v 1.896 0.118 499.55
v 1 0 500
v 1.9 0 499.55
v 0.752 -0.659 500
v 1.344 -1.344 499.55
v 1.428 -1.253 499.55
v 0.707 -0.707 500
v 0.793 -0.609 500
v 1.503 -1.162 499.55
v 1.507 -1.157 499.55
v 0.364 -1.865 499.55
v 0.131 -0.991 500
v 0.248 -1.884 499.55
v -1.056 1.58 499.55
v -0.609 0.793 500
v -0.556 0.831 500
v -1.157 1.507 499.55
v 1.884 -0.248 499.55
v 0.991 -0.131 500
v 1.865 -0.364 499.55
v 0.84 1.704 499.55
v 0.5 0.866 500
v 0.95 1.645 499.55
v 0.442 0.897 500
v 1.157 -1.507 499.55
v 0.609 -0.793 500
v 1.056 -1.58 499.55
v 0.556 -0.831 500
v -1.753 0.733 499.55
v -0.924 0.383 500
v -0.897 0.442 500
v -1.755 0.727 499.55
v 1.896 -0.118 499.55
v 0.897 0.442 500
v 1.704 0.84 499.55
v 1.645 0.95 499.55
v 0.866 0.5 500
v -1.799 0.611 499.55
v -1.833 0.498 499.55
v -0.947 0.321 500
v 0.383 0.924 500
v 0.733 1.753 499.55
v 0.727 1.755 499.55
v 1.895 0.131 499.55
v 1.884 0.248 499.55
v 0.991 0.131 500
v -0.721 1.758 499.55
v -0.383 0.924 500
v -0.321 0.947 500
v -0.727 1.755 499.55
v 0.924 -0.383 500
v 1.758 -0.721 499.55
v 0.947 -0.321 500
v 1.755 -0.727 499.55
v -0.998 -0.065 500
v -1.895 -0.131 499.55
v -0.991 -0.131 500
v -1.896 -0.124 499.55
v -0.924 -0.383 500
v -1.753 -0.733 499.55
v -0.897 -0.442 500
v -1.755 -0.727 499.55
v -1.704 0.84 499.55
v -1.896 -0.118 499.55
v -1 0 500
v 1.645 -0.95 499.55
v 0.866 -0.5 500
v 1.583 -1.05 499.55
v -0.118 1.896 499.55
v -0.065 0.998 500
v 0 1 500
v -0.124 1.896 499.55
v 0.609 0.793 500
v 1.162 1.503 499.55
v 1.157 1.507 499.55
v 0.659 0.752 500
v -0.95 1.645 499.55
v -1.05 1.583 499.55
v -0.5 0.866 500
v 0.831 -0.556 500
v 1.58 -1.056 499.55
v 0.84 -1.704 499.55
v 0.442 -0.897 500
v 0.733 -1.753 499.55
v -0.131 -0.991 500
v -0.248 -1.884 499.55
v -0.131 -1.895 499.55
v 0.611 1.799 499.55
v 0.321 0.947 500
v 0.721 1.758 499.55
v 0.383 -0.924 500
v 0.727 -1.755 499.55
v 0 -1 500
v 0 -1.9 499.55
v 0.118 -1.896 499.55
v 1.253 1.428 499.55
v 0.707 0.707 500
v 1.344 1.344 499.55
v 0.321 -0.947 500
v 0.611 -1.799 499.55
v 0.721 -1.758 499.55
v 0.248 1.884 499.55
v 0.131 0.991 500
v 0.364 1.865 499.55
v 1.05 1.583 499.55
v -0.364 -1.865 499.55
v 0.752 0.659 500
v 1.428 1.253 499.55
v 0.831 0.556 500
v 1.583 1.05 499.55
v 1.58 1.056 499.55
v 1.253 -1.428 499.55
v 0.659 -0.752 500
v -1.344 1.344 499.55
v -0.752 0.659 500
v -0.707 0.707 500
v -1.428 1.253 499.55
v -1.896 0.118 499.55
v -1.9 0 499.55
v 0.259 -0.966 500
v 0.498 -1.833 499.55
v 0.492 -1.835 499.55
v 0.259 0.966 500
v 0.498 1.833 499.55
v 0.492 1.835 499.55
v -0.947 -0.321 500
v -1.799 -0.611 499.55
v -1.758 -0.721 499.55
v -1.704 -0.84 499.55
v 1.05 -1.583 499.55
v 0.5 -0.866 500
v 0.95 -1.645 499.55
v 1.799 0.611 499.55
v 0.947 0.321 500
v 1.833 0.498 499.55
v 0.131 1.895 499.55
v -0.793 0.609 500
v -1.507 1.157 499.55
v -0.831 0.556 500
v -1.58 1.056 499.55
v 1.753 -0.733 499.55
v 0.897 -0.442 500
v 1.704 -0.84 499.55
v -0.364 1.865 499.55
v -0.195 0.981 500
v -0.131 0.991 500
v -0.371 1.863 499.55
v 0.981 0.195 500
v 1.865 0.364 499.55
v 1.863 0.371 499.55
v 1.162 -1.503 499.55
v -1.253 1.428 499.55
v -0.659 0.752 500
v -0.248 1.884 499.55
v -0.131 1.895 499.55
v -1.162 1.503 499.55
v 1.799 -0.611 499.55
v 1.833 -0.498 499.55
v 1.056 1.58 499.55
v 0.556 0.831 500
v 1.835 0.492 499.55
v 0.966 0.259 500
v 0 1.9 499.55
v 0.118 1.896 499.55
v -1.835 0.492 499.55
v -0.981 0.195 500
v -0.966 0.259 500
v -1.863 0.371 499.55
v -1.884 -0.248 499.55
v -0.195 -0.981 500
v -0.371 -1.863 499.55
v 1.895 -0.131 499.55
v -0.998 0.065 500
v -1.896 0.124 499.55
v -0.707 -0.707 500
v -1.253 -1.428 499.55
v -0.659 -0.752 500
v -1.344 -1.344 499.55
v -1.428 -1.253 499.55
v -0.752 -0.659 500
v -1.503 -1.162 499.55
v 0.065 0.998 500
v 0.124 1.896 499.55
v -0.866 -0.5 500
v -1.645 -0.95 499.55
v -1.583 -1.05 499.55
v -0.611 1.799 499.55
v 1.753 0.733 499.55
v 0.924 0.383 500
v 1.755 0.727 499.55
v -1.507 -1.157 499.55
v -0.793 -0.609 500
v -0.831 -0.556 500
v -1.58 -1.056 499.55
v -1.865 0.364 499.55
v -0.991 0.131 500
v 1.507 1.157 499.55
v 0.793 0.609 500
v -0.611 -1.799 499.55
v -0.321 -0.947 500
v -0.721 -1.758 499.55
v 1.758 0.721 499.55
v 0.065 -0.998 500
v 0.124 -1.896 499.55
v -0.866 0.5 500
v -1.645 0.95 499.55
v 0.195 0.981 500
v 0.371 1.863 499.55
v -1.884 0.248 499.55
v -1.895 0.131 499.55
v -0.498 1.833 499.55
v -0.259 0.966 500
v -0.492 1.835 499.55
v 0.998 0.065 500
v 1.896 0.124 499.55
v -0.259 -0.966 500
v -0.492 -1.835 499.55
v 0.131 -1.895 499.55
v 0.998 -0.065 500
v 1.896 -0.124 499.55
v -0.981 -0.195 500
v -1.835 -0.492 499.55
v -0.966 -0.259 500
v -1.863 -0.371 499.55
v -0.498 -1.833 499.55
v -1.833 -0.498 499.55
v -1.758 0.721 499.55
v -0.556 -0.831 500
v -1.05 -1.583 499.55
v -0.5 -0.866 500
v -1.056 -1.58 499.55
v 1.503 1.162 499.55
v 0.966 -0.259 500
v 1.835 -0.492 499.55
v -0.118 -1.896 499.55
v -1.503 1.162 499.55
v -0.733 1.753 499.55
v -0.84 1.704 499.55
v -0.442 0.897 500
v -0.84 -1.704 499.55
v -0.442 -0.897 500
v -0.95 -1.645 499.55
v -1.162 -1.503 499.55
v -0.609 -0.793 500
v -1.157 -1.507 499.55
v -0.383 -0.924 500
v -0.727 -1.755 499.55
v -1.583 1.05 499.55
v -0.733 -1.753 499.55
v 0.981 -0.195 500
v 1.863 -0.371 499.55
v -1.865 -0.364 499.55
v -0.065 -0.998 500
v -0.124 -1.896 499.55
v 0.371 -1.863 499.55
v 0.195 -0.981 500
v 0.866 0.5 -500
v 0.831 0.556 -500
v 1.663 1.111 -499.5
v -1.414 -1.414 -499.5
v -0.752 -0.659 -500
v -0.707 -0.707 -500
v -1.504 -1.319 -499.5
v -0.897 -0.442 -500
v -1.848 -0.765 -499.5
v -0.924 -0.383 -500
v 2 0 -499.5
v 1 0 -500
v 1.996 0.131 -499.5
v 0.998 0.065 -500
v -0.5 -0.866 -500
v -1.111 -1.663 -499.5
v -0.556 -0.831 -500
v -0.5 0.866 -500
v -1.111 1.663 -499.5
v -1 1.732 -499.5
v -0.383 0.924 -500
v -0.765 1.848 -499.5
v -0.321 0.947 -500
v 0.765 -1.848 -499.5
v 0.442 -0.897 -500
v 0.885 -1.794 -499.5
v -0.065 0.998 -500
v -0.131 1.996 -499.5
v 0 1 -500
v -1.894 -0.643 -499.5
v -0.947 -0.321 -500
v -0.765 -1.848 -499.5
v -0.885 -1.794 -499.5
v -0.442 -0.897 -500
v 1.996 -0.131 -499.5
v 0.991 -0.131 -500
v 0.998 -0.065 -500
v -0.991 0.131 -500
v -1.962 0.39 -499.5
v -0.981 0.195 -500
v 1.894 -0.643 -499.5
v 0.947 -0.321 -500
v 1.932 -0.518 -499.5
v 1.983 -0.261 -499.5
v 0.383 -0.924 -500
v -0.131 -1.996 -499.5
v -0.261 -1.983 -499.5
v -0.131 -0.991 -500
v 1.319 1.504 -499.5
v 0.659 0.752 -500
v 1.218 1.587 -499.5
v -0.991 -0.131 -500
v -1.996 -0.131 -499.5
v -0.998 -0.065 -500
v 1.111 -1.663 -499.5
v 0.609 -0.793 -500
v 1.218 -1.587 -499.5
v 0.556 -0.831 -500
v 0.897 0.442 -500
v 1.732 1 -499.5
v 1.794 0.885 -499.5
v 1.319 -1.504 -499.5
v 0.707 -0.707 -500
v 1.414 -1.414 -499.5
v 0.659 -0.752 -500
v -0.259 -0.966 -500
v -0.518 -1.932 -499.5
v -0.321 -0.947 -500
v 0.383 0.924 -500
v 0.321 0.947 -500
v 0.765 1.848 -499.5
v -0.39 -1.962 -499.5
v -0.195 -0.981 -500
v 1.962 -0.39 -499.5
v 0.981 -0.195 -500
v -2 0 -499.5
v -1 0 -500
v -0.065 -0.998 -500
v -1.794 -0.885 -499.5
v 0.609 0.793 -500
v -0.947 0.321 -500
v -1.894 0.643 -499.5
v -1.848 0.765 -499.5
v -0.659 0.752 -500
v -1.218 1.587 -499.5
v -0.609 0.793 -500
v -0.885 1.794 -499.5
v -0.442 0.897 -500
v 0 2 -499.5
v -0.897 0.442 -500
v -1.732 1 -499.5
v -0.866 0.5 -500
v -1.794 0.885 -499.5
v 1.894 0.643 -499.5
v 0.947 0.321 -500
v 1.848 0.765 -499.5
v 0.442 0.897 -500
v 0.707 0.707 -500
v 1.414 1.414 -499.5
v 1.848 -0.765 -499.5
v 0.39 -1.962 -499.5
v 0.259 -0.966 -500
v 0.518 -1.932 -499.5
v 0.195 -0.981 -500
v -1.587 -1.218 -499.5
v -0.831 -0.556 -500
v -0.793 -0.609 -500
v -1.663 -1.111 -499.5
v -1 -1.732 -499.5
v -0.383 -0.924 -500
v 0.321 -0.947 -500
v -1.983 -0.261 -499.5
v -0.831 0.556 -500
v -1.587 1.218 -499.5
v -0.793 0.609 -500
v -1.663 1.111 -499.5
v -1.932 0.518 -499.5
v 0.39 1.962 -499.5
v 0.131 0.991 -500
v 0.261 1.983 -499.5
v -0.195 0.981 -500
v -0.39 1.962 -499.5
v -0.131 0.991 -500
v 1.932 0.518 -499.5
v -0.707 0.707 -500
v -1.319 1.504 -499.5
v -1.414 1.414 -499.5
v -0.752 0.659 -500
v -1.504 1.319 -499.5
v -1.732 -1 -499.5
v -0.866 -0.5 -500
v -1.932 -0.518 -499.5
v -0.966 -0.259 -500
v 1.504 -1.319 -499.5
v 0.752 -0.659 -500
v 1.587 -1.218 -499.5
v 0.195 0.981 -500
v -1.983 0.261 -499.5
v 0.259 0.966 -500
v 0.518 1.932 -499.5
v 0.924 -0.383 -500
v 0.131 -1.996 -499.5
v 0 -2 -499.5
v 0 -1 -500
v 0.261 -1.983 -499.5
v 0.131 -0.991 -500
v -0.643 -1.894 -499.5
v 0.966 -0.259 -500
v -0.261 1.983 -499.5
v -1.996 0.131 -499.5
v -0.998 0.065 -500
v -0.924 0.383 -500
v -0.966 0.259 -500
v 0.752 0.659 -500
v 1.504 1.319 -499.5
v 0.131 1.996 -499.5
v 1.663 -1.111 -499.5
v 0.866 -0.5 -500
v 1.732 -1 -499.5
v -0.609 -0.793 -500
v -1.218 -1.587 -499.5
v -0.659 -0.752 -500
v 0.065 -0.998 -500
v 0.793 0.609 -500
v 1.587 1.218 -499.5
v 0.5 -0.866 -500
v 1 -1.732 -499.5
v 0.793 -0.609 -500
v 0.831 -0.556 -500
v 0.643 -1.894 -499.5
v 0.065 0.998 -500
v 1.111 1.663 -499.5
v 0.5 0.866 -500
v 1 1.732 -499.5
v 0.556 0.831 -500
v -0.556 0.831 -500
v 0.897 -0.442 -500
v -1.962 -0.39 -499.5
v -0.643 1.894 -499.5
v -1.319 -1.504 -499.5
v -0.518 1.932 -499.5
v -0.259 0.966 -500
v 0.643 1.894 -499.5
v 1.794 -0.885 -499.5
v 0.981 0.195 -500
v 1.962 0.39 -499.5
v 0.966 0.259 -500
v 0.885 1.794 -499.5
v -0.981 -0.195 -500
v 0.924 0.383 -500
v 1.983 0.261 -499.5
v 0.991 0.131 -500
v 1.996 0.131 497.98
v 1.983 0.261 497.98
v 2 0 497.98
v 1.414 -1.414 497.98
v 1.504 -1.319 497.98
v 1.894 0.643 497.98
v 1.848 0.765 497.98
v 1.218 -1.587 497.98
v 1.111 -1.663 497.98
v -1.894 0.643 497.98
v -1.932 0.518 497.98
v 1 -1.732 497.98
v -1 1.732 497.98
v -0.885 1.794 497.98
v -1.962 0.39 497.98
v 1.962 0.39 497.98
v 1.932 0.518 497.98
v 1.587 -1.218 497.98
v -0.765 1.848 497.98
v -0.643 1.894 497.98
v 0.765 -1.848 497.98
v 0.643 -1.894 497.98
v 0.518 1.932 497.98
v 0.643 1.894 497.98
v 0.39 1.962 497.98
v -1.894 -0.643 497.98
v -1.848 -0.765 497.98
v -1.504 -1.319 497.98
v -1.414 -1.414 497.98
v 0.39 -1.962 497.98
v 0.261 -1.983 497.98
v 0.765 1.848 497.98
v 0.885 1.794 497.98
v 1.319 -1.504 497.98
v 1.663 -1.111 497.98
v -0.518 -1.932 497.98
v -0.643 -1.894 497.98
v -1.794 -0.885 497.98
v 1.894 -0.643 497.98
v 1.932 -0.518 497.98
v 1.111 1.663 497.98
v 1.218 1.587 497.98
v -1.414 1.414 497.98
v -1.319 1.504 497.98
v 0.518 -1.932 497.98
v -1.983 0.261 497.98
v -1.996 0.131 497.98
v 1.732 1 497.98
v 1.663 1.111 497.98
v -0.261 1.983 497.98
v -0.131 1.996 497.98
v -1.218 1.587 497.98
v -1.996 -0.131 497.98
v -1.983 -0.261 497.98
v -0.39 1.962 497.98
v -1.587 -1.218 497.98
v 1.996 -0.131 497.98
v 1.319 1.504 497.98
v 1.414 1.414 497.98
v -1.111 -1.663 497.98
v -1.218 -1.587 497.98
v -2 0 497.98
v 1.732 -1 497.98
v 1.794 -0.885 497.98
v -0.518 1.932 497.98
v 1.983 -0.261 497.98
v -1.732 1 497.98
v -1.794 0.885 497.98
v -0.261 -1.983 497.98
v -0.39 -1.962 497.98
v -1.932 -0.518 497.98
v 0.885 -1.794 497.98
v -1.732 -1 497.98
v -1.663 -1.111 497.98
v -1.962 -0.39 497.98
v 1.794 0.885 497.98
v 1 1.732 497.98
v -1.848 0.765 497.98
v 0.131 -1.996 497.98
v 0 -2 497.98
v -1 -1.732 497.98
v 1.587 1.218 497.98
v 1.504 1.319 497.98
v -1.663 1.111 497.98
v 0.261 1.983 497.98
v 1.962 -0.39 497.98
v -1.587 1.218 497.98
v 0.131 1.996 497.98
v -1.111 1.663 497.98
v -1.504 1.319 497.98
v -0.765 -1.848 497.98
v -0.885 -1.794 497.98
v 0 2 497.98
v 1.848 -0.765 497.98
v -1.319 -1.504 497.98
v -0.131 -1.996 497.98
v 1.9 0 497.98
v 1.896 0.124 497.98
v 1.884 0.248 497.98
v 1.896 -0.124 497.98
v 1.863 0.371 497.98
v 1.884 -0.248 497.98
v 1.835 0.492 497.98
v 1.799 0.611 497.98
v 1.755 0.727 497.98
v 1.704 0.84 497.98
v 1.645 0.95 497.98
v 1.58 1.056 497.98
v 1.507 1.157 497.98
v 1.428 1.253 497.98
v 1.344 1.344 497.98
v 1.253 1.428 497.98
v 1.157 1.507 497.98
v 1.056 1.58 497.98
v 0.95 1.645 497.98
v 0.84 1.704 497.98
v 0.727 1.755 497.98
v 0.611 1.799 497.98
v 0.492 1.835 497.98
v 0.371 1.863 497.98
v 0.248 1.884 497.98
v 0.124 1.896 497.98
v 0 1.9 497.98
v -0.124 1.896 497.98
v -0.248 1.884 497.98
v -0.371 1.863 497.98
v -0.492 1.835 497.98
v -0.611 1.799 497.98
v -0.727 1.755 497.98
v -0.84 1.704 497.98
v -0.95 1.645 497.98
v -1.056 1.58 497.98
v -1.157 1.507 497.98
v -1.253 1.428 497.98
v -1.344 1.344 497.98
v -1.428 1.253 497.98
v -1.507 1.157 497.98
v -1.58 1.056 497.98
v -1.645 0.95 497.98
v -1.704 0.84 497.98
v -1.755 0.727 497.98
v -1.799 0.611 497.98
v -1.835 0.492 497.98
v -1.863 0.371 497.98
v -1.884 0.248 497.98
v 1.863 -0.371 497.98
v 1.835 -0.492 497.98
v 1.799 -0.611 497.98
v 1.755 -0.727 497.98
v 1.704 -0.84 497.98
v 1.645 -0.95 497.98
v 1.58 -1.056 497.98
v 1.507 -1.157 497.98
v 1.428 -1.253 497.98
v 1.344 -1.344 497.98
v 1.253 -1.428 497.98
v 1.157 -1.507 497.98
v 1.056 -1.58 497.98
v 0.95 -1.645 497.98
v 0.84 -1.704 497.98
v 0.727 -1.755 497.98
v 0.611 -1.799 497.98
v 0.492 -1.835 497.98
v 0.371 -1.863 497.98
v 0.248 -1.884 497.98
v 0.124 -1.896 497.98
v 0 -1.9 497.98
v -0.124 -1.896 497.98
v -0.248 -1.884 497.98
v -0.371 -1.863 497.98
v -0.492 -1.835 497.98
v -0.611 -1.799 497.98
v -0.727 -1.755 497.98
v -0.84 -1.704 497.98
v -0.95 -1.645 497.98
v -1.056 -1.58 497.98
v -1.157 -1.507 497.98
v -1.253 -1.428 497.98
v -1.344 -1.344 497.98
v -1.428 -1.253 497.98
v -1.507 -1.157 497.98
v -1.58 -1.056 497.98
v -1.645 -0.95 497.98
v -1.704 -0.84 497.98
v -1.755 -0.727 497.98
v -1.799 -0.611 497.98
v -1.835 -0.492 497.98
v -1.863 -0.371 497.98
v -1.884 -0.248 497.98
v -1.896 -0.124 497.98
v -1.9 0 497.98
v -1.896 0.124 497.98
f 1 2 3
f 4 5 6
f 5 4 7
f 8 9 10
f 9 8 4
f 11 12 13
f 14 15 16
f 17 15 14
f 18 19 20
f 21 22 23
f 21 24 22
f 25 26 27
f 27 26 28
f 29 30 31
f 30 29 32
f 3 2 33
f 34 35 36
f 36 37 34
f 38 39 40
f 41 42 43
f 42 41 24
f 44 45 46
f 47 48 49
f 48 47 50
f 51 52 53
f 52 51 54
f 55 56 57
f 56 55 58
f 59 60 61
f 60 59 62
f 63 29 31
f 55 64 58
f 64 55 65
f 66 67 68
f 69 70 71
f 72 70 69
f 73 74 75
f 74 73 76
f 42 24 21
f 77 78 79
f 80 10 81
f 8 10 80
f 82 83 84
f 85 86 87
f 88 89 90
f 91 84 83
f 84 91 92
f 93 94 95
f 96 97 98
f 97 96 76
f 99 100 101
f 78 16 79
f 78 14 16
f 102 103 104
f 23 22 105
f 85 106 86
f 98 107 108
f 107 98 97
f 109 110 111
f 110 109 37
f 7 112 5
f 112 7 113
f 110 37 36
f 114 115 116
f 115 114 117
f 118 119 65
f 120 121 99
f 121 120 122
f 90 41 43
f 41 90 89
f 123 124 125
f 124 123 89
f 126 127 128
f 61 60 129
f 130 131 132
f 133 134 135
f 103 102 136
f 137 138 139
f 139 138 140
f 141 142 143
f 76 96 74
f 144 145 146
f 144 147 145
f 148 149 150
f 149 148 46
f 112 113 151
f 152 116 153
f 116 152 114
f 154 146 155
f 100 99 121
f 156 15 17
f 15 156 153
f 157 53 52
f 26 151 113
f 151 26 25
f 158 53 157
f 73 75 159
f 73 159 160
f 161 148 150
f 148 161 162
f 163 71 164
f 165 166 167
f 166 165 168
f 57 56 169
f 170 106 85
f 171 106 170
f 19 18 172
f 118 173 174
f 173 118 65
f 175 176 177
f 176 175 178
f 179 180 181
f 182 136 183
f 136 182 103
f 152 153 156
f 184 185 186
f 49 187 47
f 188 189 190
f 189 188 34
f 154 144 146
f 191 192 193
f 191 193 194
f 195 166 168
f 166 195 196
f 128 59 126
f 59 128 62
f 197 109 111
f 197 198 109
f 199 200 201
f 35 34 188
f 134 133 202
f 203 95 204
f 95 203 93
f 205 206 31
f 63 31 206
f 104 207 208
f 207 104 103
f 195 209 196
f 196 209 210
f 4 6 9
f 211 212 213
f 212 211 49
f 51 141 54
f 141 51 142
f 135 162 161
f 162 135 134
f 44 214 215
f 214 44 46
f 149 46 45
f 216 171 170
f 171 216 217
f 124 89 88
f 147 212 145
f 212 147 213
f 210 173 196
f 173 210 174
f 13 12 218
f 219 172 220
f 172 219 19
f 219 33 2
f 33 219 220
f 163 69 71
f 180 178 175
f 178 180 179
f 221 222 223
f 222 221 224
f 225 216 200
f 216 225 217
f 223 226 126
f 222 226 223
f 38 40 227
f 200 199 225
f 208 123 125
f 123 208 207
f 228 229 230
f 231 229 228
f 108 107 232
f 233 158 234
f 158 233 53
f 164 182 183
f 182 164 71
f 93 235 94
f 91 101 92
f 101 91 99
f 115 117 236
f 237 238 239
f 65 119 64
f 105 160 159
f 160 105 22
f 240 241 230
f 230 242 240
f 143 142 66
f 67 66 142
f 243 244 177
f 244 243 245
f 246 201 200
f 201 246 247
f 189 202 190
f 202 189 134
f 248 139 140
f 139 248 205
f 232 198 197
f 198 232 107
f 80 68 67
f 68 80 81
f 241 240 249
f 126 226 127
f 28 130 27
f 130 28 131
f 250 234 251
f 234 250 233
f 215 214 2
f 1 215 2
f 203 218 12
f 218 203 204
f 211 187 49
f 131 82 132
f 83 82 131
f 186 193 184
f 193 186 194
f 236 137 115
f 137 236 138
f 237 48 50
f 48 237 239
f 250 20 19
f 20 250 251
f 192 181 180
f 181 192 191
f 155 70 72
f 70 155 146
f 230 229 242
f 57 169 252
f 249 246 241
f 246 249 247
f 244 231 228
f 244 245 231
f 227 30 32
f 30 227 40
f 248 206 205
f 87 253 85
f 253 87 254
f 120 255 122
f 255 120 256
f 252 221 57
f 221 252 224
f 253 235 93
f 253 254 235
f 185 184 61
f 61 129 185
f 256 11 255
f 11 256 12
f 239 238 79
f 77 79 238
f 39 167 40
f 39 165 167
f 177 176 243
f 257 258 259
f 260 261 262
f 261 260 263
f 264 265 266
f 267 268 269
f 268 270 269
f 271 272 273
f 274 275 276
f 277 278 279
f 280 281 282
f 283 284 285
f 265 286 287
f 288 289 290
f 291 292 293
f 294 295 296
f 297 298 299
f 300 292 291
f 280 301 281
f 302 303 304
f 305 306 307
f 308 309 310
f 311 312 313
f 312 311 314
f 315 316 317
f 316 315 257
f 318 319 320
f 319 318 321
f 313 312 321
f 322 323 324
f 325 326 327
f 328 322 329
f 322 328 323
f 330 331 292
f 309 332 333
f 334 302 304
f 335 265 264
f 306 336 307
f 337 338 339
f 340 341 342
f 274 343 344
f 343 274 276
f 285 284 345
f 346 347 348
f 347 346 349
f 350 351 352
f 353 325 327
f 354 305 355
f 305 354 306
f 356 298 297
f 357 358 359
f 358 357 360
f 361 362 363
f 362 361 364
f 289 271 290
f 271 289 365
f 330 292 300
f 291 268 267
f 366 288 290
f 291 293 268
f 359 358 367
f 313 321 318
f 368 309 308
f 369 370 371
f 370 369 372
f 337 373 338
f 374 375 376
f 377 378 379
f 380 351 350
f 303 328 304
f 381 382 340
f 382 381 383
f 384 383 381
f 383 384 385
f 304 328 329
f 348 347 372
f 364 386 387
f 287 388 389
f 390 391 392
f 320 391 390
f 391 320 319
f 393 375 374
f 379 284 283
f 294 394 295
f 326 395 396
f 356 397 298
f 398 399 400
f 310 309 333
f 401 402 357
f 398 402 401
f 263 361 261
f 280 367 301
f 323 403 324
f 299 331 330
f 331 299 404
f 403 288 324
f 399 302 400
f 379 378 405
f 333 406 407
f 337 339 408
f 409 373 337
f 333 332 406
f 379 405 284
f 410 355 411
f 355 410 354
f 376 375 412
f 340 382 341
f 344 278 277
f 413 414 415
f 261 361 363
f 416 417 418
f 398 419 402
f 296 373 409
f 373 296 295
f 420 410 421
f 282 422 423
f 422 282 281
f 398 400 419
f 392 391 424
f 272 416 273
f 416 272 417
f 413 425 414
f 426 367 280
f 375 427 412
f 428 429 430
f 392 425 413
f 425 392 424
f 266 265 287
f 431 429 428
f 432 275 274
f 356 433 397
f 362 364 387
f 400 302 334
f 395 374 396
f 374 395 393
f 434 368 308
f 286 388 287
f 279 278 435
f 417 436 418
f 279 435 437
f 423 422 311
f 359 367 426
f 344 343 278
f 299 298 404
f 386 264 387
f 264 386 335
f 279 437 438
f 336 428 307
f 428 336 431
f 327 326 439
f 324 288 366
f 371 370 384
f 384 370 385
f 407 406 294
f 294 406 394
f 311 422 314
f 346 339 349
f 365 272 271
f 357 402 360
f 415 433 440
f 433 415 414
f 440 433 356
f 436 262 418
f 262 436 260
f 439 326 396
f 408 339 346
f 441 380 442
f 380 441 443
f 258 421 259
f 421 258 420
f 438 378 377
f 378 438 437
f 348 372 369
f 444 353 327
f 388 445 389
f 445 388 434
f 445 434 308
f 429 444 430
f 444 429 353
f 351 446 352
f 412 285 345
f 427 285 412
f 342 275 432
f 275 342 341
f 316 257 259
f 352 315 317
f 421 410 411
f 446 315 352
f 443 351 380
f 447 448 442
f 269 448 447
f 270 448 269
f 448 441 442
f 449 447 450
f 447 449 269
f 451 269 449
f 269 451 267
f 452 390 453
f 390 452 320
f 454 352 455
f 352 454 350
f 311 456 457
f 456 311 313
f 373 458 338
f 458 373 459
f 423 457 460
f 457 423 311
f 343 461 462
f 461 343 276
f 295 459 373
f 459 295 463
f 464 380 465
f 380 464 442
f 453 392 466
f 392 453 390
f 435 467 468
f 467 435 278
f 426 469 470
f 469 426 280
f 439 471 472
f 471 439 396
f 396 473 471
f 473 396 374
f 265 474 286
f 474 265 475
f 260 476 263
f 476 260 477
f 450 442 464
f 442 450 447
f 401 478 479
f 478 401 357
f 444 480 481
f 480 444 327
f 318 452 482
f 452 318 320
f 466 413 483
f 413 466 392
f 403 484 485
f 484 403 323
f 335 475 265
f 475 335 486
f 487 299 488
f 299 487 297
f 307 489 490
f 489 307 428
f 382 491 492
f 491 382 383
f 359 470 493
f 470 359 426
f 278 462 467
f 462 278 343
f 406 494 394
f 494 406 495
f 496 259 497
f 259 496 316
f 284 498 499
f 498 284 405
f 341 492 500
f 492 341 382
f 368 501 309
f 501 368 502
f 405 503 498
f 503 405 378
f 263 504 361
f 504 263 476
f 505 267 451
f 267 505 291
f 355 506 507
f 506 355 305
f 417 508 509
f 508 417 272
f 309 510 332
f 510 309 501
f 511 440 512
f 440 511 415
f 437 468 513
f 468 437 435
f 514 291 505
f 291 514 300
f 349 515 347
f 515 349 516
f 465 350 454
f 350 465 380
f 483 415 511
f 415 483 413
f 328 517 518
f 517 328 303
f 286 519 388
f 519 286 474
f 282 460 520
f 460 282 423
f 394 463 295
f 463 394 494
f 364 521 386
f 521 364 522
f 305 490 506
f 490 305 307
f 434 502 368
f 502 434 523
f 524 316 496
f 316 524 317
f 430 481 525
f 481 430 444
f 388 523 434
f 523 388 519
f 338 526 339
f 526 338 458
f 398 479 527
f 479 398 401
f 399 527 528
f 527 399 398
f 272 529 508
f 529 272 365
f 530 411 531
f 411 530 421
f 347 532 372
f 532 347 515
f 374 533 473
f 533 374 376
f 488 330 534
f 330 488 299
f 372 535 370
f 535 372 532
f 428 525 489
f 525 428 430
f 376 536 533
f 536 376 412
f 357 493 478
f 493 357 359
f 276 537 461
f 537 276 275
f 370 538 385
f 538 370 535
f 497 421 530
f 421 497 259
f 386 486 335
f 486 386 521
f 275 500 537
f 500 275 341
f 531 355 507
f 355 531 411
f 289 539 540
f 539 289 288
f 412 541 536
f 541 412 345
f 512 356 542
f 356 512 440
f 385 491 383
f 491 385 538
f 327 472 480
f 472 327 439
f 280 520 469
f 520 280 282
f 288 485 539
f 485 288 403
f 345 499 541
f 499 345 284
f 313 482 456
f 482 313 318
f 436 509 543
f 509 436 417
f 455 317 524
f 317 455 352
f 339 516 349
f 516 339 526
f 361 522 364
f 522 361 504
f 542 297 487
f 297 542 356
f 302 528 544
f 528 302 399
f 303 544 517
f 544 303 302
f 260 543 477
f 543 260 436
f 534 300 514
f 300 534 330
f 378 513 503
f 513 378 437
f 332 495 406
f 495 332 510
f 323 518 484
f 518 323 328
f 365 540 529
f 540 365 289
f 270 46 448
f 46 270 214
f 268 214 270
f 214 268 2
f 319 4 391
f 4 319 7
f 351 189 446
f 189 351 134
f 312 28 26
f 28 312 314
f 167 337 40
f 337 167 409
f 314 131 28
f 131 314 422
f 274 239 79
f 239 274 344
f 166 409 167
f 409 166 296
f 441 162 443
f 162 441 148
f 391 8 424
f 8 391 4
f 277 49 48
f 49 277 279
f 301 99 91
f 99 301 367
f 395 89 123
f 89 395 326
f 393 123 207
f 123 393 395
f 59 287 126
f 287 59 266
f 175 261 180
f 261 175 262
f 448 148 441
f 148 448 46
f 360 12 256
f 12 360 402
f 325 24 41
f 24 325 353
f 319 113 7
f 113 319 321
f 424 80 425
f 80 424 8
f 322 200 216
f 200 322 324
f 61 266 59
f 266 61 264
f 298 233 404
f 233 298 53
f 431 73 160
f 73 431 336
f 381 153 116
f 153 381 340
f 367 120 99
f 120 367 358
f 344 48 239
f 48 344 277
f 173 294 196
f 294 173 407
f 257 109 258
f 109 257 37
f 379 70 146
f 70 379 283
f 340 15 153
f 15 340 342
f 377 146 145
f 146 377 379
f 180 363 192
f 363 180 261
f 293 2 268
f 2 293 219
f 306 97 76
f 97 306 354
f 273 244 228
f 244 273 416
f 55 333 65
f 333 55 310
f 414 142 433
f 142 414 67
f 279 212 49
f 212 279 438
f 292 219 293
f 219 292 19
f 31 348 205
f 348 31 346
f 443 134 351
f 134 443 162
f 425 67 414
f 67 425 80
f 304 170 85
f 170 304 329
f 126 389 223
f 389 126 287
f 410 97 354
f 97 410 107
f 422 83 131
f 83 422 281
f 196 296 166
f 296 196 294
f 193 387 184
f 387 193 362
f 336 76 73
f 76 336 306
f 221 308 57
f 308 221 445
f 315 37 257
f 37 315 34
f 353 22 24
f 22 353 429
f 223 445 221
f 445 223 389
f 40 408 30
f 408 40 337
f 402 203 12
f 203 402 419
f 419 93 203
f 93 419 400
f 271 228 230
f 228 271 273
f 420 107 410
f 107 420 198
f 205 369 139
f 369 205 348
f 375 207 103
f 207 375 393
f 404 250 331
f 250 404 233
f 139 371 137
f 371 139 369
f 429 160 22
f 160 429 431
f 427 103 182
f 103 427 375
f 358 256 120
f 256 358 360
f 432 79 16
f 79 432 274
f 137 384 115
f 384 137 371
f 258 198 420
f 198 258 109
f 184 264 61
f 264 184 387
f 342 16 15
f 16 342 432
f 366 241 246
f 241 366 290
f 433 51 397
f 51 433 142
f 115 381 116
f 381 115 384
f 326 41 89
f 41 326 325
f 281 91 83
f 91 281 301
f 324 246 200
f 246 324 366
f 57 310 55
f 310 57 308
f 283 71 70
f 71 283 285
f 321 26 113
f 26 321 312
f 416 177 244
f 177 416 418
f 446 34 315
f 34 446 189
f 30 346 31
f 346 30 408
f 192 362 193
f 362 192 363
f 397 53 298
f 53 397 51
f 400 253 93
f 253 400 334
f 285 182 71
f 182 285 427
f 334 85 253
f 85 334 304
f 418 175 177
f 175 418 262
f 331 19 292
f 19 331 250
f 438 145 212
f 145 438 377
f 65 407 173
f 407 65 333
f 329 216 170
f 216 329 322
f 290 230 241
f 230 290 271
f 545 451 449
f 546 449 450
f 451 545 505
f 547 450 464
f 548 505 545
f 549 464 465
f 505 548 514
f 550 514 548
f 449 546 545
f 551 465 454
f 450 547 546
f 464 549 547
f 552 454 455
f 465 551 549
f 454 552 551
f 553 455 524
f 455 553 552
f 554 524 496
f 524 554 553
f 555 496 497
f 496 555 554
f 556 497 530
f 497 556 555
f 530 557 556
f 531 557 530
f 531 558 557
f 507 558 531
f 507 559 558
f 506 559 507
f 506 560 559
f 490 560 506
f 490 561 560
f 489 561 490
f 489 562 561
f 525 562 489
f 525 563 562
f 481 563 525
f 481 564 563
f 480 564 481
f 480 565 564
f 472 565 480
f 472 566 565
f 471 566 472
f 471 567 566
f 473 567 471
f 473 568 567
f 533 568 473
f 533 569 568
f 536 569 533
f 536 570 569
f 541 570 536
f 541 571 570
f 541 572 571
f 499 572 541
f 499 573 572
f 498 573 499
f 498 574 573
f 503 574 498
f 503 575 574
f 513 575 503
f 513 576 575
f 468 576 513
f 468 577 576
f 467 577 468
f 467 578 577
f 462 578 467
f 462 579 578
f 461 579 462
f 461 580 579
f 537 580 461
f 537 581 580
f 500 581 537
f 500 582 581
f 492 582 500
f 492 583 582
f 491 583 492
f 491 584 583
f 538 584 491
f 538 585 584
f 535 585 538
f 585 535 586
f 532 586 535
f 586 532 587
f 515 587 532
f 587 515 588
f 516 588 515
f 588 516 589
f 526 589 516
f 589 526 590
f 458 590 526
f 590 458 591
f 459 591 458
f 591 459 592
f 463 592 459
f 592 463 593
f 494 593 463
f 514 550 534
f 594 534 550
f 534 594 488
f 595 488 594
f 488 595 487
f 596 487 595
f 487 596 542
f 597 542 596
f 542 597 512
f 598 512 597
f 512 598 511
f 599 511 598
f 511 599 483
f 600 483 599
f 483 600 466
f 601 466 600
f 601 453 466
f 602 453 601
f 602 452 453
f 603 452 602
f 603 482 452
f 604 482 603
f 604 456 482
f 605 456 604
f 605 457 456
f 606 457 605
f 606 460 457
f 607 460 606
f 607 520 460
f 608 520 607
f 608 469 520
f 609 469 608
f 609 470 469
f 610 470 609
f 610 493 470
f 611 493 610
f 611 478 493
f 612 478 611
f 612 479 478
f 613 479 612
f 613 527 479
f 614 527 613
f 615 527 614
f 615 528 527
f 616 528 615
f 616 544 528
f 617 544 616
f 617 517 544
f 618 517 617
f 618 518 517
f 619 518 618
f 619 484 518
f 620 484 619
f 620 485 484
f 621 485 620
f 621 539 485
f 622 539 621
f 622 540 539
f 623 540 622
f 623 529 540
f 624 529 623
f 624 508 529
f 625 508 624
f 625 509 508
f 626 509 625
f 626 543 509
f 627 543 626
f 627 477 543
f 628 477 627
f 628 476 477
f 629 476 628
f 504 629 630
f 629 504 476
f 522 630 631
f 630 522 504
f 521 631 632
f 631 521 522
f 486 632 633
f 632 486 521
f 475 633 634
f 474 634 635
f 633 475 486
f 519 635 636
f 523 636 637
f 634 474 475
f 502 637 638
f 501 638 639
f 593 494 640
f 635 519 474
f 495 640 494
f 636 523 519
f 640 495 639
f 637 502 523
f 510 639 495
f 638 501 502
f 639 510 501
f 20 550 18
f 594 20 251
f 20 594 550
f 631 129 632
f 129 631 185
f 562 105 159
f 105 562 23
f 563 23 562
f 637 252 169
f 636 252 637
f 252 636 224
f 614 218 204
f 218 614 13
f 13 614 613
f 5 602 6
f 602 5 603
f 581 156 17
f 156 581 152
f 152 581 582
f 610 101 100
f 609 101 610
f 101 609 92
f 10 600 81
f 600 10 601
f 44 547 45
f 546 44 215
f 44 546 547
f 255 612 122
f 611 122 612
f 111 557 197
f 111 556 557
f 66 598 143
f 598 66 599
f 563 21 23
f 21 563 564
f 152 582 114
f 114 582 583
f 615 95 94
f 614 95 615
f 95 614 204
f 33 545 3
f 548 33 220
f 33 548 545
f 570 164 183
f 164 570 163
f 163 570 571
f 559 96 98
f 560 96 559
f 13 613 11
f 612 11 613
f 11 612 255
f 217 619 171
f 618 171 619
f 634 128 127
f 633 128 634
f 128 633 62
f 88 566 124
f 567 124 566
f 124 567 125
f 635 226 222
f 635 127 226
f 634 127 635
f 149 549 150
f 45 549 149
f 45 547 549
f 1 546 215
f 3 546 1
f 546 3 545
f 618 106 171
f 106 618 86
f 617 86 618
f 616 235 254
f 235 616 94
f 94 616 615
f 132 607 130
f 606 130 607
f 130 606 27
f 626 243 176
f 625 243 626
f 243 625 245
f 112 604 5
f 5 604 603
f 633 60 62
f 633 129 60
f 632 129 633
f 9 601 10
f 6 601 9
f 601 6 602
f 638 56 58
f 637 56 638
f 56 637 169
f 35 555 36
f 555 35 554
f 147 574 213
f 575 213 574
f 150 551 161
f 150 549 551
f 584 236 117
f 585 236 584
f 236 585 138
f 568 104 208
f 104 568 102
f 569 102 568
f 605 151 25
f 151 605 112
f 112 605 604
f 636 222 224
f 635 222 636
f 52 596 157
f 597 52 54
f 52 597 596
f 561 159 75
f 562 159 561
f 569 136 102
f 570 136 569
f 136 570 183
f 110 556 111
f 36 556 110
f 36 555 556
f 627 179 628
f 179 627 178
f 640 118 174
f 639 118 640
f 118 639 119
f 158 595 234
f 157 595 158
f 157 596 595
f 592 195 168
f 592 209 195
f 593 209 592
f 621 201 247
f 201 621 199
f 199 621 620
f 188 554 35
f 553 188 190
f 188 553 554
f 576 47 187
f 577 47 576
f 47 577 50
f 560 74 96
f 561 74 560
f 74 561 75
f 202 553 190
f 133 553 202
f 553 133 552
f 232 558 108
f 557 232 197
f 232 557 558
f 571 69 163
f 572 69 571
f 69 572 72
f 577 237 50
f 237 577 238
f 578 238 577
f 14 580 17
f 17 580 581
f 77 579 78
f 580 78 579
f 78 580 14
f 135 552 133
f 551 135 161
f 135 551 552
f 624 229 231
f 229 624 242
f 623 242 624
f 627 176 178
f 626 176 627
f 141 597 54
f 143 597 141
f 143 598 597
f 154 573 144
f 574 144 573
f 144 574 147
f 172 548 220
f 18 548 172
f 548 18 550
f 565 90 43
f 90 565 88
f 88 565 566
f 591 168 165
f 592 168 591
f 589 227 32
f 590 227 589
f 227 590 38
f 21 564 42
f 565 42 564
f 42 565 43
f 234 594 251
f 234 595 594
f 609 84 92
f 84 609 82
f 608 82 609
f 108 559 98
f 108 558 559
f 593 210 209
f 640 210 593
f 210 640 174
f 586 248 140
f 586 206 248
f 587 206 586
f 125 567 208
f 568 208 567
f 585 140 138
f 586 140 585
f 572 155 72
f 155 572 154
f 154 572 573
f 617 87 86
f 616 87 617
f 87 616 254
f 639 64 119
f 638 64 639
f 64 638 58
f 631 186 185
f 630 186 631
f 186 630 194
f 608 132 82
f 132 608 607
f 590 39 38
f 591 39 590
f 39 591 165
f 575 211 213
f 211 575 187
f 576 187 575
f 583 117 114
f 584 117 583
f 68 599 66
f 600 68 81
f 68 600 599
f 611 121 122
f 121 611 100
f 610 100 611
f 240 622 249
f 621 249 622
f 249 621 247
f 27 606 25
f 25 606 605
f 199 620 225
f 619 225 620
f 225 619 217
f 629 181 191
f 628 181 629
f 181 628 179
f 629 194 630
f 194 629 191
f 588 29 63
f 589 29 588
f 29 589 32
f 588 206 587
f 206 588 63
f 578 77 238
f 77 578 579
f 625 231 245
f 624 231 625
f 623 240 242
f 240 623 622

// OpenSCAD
// PTFE tubing (robust, non-blank render, single connected solid)

// Parameters
tube_L = 1000; //[500:2000:1]
tube_OD = 4;   //[2:8:0.1]
tube_ID = 2;   //[1:6:0.1]
end_chamfer = 0.5;      //[0:2:0.05]
end_fillet_r = 0.25;    //[0:1:0.05]
overlap = 1;            //[0.5:2:0.1]
mark_band_w = 2;        //[0.5:10:0.5]
mark_band_depth = 0.1;  //[0.05:0.5:0.05]

$fn = 96;

// ---- Derived / clamped values to avoid invalid geometry ----
eps = 0.02;

OD = max(tube_OD, 2*eps);
ID = min(max(tube_ID, 2*eps), OD - 2*eps);
wall = (OD - ID)/2;

// keep chamfer within length
ch = min(max(end_chamfer, 0), max(tube_L/2 - eps, 0));

// fillet limited by wall and by length
fil = min(max(end_fillet_r, 0), max(min(wall, tube_L/2) - eps, 0));

// marking band
band_w = min(max(mark_band_w, eps), max(tube_L - 2*eps, eps));
band_d = min(max(mark_band_depth, 0), max(wall - eps, 0));

// ---- Core tube with chamfered ends (hollow) ----
module tube_shell_chamfered(L, ODv, IDv, chv) {
    difference() {
        union() {
            // main outer body shortened by chamfers
            cylinder(h = max(L - 2*chv, eps), r = ODv/2, center = true);

            if (chv > eps) {
                // top chamfer frustum (outer to inner)
                translate([0, 0, L/2 - chv/2])
                    cylinder(h = chv, r1 = ODv/2, r2 = IDv/2, center = true);

                // bottom chamfer frustum (inner to outer)
                translate([0, 0, -(L/2 - chv/2)])
                    cylinder(h = chv, r1 = IDv/2, r2 = ODv/2, center = true);
            }
        }

        // Inner bore (slightly longer to guarantee clean subtraction)
        cylinder(h = L + 2*max(overlap, eps), r = IDv/2, center = true);
    }
}

// ---- Shallow recessed marking band (subtracted from OD only) ----
module marking_recess(L, ODv, band_wv, band_dv) {
    // Place band near one end (still fully on the tube), using formulas only
    zc = (L/2 - band_wv/2 - eps);

    translate([0, 0, zc])
        difference() {
            // outer "cutter" ring volume
            cylinder(h = band_wv, r = ODv/2 + max(overlap, eps), center = true);
            // inner limit so only a shallow recess is removed
            cylinder(h = band_wv + 2*max(overlap, eps), r = max(ODv/2 - band_dv, eps), center = true);
        }
}

// ---- Base model (no fillet) ----
module ptfe_tube_base(L, ODv, IDv, chv) {
    difference() {
        tube_shell_chamfered(L, ODv, IDv, chv);
        if (band_d > eps)
            marking_recess(L, ODv, band_w, band_d);
    }
}

// ---- Final model ----
// Avoid Minkowski on a long tube (often causes blank/failed renders). Use base tube.
// Keep fillet parameter but render robustly.
ptfe_tube_base(tube_L, OD, ID, ch);
